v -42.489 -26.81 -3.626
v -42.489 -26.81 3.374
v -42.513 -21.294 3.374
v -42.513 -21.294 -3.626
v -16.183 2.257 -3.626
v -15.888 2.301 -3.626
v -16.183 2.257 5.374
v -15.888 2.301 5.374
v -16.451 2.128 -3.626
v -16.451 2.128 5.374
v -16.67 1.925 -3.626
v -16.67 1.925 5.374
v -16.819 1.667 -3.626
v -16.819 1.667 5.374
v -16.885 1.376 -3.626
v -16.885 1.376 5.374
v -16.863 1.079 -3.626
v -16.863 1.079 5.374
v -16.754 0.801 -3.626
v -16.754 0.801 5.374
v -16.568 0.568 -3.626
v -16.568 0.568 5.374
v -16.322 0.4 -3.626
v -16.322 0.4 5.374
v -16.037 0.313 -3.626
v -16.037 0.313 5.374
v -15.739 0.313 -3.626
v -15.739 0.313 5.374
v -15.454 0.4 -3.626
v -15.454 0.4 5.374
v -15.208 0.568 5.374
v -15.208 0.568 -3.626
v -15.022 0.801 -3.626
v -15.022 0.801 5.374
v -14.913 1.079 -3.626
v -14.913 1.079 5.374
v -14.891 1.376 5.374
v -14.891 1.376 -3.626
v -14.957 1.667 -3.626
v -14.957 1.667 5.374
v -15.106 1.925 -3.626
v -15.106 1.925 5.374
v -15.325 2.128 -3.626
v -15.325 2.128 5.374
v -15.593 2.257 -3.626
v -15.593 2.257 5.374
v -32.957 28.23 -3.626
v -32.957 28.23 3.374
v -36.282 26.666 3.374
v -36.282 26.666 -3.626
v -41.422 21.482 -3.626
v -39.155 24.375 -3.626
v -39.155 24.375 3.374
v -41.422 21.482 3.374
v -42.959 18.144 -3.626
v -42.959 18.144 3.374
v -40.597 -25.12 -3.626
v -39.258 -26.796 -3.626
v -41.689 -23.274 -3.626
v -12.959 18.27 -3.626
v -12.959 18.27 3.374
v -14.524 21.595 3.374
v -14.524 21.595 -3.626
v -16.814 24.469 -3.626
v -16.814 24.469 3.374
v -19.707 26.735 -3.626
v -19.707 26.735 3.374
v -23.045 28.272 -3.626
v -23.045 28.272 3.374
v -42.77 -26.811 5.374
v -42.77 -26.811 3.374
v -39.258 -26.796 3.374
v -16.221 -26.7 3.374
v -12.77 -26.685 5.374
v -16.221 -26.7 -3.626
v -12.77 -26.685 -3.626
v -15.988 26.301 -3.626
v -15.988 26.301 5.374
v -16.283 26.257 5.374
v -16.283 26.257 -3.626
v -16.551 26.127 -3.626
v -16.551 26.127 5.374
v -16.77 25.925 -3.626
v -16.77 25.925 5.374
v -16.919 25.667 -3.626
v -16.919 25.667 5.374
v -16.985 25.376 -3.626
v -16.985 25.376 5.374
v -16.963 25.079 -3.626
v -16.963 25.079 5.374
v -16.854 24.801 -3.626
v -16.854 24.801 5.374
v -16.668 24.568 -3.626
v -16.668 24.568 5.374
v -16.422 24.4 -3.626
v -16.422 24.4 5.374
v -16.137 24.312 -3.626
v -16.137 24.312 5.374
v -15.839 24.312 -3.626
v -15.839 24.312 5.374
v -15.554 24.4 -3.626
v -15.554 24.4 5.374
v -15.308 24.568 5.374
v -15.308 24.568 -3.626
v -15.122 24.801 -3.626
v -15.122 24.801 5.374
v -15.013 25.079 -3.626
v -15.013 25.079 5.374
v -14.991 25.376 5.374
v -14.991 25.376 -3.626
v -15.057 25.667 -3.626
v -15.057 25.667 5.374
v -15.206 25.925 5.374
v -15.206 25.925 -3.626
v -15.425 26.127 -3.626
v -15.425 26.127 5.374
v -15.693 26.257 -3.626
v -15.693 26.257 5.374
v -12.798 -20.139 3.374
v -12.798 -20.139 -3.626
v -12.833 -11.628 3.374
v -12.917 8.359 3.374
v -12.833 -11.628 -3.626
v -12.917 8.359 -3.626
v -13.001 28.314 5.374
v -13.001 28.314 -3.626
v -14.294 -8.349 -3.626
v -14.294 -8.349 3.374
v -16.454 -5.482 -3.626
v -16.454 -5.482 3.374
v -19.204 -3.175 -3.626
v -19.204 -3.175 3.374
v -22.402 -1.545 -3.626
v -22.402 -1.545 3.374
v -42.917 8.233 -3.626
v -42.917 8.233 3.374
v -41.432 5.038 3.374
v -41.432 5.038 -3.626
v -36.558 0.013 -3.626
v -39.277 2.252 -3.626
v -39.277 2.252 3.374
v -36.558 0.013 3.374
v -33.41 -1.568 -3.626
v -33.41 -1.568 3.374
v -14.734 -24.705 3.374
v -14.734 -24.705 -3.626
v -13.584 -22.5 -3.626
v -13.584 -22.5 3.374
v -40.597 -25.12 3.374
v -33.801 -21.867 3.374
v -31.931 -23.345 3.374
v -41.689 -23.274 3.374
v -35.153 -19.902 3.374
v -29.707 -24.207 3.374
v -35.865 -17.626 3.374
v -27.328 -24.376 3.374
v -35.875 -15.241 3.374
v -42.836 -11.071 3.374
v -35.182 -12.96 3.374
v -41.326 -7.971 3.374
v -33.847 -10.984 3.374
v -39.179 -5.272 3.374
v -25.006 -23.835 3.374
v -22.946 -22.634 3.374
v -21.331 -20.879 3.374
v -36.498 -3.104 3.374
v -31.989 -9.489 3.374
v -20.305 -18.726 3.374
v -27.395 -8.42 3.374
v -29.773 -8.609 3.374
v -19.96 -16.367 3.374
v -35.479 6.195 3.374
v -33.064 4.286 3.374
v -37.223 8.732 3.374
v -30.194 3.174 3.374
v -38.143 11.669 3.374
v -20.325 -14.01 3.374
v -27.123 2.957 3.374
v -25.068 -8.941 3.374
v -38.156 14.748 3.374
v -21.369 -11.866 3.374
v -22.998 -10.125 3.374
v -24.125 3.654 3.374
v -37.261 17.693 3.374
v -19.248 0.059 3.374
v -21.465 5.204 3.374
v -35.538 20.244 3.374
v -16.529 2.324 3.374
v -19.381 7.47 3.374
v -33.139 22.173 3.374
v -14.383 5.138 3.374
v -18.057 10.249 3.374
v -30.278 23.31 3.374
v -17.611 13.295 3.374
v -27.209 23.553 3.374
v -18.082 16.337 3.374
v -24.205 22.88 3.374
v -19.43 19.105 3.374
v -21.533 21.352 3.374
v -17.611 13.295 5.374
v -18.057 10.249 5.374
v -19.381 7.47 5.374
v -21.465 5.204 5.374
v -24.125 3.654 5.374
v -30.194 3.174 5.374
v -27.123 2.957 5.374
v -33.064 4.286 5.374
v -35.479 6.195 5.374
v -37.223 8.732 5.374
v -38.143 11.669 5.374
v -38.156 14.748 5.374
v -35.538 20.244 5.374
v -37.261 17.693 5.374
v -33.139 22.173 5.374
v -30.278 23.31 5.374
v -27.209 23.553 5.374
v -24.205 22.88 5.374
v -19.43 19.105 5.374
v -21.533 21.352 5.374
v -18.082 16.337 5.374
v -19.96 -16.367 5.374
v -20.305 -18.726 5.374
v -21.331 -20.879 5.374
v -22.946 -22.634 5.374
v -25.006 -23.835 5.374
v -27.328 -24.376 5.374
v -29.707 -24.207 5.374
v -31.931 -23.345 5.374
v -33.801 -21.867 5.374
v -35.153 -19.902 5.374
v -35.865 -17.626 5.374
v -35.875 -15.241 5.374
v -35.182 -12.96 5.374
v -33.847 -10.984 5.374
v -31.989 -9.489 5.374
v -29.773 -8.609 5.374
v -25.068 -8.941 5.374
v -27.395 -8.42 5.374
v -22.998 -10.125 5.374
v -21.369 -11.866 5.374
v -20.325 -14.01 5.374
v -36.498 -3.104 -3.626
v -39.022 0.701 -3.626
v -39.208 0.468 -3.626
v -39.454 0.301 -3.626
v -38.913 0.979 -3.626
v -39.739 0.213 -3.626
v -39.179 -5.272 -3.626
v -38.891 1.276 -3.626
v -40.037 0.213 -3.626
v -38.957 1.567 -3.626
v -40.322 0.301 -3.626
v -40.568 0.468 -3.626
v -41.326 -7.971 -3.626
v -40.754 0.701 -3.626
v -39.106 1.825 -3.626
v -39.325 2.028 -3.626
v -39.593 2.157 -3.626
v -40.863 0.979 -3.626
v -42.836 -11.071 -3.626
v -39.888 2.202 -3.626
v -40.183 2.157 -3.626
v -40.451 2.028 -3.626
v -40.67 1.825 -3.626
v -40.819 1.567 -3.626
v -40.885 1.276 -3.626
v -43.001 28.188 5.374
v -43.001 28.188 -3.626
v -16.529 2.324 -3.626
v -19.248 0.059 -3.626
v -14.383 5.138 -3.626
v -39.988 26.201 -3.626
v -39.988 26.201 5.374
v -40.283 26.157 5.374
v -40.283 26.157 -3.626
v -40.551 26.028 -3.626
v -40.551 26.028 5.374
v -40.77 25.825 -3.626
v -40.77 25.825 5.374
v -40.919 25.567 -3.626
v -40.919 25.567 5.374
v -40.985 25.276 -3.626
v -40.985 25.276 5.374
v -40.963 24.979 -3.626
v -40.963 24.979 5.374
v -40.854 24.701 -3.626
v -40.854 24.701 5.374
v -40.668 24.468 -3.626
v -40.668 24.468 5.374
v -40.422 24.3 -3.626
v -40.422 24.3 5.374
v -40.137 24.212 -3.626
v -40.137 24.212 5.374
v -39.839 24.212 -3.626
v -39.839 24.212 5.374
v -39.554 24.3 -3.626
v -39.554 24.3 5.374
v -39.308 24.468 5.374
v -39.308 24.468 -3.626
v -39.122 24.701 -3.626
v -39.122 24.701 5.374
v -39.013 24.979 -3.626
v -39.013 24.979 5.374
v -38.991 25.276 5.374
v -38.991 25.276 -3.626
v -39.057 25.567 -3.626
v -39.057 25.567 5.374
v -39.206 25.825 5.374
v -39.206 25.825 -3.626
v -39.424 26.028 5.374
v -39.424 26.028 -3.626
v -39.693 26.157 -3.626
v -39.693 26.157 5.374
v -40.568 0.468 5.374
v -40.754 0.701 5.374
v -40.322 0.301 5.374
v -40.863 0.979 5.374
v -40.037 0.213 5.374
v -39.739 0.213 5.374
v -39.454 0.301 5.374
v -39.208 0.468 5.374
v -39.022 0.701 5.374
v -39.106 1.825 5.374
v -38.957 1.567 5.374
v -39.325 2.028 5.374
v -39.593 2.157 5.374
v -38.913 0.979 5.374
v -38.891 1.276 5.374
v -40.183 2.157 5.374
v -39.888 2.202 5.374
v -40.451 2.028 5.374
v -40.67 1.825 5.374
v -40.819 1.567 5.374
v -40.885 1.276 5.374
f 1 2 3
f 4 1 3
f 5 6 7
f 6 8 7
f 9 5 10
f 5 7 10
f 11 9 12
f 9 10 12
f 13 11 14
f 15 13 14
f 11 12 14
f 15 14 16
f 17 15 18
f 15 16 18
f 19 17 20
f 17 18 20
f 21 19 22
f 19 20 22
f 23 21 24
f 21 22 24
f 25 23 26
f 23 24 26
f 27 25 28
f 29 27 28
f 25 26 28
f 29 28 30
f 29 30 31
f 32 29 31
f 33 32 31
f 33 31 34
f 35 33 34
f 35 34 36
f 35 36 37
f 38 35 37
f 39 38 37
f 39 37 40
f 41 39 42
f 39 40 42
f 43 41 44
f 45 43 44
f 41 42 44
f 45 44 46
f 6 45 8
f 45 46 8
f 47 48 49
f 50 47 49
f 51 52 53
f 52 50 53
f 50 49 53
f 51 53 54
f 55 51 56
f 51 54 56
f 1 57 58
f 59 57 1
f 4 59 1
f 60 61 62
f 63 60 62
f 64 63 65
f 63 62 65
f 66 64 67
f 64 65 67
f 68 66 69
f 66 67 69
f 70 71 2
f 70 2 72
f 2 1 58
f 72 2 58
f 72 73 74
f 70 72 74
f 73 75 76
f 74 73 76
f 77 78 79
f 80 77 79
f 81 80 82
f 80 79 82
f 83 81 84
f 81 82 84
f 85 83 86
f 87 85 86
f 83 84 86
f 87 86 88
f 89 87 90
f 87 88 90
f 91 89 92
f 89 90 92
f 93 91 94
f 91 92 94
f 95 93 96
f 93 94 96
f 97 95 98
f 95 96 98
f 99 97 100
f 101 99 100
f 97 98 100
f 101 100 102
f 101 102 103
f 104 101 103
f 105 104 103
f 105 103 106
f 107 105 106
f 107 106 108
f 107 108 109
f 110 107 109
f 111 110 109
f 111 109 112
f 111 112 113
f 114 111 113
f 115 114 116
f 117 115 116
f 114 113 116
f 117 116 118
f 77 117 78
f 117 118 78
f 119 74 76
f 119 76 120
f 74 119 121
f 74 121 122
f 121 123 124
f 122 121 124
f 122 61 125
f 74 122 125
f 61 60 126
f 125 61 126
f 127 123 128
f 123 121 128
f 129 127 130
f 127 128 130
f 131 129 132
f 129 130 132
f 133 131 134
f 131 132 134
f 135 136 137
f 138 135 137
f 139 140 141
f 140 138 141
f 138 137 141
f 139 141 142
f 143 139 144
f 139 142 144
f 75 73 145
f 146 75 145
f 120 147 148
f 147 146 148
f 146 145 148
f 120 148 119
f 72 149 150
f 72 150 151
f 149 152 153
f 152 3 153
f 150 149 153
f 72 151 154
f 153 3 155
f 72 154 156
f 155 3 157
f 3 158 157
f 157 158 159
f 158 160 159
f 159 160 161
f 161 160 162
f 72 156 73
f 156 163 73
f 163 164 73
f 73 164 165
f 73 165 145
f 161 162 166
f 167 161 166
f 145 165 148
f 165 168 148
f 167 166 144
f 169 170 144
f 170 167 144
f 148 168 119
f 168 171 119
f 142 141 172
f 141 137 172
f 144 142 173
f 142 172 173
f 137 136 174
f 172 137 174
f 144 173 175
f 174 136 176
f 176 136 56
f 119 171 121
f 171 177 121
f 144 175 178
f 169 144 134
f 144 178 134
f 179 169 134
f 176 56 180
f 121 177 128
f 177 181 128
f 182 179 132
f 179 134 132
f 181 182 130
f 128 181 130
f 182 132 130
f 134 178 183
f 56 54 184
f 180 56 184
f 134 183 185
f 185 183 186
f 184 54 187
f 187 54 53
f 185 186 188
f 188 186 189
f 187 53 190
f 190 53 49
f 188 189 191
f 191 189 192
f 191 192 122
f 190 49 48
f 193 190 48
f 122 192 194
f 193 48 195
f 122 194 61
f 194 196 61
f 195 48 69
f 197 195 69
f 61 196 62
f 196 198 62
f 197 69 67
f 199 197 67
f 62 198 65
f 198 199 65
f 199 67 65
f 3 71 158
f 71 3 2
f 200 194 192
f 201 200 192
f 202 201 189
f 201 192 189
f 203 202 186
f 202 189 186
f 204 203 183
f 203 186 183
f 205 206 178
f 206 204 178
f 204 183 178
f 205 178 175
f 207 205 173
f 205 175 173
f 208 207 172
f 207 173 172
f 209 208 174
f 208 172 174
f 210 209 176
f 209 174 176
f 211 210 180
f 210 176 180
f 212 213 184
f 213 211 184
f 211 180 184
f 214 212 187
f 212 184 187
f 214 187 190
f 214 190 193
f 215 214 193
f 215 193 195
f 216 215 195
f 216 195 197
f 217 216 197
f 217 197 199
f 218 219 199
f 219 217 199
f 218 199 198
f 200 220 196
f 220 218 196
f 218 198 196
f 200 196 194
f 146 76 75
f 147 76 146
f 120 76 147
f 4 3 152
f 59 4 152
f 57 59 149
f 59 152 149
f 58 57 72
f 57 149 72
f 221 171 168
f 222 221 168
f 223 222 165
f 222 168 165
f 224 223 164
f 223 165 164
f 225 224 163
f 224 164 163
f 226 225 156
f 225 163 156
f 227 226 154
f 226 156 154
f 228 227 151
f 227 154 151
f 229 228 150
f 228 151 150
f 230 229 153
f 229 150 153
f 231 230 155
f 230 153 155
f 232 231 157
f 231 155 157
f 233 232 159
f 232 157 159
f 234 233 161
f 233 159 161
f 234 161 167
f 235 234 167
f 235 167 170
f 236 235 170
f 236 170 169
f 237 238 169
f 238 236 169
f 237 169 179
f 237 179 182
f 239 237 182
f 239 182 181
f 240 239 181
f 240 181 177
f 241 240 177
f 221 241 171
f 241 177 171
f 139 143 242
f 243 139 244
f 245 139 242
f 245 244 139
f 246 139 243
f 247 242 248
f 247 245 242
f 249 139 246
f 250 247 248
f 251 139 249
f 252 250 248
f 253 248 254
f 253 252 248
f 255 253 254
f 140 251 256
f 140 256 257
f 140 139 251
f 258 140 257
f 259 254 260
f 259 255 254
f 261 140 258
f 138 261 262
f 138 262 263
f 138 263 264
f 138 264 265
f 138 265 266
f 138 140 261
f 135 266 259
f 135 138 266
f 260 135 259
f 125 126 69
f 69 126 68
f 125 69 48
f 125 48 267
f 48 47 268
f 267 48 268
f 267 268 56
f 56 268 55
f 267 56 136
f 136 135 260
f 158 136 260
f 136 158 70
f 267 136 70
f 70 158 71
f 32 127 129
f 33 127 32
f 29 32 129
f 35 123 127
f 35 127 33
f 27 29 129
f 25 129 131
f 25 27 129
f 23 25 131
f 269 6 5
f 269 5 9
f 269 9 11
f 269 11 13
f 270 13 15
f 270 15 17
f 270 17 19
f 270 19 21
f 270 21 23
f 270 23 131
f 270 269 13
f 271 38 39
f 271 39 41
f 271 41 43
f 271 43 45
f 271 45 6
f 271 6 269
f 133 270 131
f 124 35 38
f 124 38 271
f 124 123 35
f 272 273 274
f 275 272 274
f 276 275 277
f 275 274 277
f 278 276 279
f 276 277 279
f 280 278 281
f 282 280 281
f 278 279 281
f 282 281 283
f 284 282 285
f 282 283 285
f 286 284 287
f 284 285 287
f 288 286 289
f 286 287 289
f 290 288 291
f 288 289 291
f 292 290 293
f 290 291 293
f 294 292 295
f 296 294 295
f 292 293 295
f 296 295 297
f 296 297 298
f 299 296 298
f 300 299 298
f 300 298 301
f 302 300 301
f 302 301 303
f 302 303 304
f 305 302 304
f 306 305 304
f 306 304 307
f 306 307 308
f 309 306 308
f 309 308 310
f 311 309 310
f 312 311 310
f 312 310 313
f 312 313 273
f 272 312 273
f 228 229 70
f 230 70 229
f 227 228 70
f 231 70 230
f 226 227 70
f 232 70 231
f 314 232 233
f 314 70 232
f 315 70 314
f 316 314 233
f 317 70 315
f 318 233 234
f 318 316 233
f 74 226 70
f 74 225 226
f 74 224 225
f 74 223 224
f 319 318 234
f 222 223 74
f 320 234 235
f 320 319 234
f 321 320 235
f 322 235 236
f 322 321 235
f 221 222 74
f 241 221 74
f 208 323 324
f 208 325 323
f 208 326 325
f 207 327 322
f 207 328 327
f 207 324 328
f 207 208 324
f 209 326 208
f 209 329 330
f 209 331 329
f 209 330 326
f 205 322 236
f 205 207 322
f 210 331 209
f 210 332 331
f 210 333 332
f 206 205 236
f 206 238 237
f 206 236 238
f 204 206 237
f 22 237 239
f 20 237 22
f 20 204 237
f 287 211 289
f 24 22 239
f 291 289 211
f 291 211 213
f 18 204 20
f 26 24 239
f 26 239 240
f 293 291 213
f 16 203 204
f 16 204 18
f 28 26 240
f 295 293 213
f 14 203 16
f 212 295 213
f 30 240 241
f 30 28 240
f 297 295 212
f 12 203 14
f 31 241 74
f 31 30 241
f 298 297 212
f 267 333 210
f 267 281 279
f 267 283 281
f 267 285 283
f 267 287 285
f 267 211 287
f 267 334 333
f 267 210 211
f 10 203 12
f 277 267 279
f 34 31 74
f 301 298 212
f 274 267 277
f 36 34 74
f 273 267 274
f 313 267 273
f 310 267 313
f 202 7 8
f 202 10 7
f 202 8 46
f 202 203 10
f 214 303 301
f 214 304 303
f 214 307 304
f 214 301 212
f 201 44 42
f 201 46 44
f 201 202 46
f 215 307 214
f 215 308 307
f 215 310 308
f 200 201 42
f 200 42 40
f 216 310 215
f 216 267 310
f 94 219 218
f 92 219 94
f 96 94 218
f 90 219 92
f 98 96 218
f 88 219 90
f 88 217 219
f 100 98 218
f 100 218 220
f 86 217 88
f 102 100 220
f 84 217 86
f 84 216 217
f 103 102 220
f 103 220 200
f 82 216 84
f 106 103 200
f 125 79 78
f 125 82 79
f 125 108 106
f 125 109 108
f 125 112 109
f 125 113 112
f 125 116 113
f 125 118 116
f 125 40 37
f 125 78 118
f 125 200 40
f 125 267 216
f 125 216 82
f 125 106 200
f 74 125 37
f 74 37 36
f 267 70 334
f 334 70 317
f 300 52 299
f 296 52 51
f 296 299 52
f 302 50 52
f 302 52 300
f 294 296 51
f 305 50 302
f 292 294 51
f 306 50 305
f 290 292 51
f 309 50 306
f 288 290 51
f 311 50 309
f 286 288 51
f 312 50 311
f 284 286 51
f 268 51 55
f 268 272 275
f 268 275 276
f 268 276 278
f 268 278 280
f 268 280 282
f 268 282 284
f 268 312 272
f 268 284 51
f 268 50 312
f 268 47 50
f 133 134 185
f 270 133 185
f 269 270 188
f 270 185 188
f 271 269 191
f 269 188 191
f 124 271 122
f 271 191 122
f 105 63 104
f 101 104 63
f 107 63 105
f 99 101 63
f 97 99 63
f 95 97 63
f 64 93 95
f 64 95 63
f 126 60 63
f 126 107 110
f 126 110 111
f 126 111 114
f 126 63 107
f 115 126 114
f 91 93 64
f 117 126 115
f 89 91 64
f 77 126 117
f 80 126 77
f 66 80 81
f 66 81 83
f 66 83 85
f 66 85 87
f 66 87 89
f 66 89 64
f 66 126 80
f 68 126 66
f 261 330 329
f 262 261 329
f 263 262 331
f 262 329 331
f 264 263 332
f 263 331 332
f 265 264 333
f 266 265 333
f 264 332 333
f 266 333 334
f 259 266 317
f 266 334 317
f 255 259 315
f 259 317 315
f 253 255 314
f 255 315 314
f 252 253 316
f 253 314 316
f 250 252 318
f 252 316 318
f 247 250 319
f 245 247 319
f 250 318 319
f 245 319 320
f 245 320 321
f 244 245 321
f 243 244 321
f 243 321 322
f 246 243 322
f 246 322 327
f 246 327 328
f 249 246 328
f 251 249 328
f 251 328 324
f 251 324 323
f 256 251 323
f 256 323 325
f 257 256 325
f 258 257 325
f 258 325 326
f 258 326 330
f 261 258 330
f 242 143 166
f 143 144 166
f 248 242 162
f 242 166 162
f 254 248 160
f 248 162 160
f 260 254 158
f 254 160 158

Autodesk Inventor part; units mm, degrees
ref_plane "YZ Plane" through (0, 0, 0) normal (1, 0, 0) x (0, 1, 0)
ref_plane "XZ Plane" through (0, 0, 0) normal (0, 1, 0) x (-1, 0, 0)
ref_plane "XY Plane" through (0, 0, 0) normal (0, 0, 1) x (1, 0, 0)
ref_plane "Work Plane1" through (0, 0, 0) normal (0, 0, 1) x (1, 0, 0)
ref_plane "Work Plane2" through (-27.9392, 13.2515, 3.3744) normal (0, 0, 1) x (1, 0.0042, 0)
sketch "Sketch4" plane through (-27.9392, 13.2515, 3.3744) normal (0, 0, 1) x (1, 0.0042, 0)
  circle A0 centre (0.0013, -0.0001) radius 12.5 construction
  line L0 (15.0013, 14.9999) -> (-14.9987, 14.9999) construction
  line L1 (-14.9987, 14.9999) -> (-14.9987, -40.0001) construction
  line L2 (-14.9987, -40.0001) -> (15.0013, -40.0001) construction
  line L3 (15.0013, -40.0001) -> (15.0013, 14.9999) construction
  line L4 (15.0013, 14.9999) -> (-14.9987, 14.9999)
  line L5 (-14.9987, 14.9999) -> (-14.9987, -40.0001)
  line L6 (-14.9987, -40.0001) -> (15.0013, -40.0001)
  line L7 (15.0013, -40.0001) -> (15.0013, 14.9999)
  circle A1 centre (0.0013, -0.0001) radius 10.3271
  circle A2 centre (-0.1451, -29.1987) radius 12.8 construction
  circle A3 centre (-0.1451, -29.6517) radius 8.1726 construction
  circle A4 centre (-0.1451, -29.6517) radius 8
  point P0 (27.8838, -13.3677)
  dimension "d13" = 15
  dimension "d14" = 15
  dimension "d15" = 15
  dimension "d16" = 40
  dimension "d17" = 16
  dimension "d34" = 29.652
extrude "Extrusion4" add sketch "Sketch4" along normal blind 2
sketch "Sketch5" plane through (-27.9392, 13.2515, 3.3744) normal (0, 0, -1) x (-1, -0.0042, 0)
  line L0 (15.2891, -0.4637) -> (15.1772, -1.9039) construction
  circle A0 centre (-0.0013, -0.0001) radius 12.5 construction
  line L1 (15.4424, -29.5809) -> (15.3809, -31.0242) construction
  circle A1 centre (-0.0013, -0.0001) radius 10.3271 construction
  circle A2 centre (0.1451, -29.6517) radius 8 construction
  line L2 (-15.0013, 14.9999) -> (14.9987, 14.9999) construction
  line L3 (-15.0013, -40.0001) -> (-15.0013, 14.9999) construction
  line L4 (14.9987, -40.0001) -> (-15.0013, -40.0001) construction
  line L5 (14.9987, 14.9999) -> (14.9987, -40.0001) construction
  line L6 (-15.0013, -40.0001) -> (14.7184, -40.0001)
  circle A3 centre (-0.0013, -0.0001) radius 15.2975 construction
  line L7 (14.9987, -40.0001) -> (-15.0013, -40.0001) projected
  line L8 (14.9987, 14.9999) -> (14.9987, -40.0001) projected
  line L9 (-15.0013, -40.0001) -> (-15.0013, 14.9999) projected
  line L10 (14.9987, 4.9557) -> (14.9987, 14.9999)
  arc A4 (5.5328, -14.7966) -> (14.9987, -4.956) centre (-0.0013, -0.0001) ccw
  line L11 (14.7184, -40.0001) -> (14.7184, -34.4839)
  line L12 (14.9987, -24.2596) -> (14.9987, -4.956)
  arc A5 (14.9987, -24.2596) -> (5.5328, -14.7966) centre (0.1451, -29.6517) ccw
  arc A6 (11.4871, -40.0001) -> (14.7184, -34.4839) centre (0.1451, -29.6517) ccw
  line L13 (-15.0013, 4.9557) -> (-15.0013, -4.956)
  line L14 (-15.0013, -33.4542) -> (-15.0013, -40.0001)
  arc A7 (-4.7152, -14.5532) -> (-15.0013, -24.943) centre (0.1451, -29.6517) ccw
  arc A8 (-15.0013, -33.4542) -> (-11.5503, -40.0001) centre (0.1451, -29.6517) ccw
  arc A9 (-15.0013, -4.956) -> (-5.4746, -14.8192) centre (-0.0013, -0.0001) ccw
  arc A10 (14.9987, 4.9557) -> (4.9545, 14.9999) centre (-0.0013, -0.0001) ccw
  arc A11 (-4.9572, 14.9999) -> (-15.0013, 4.9557) centre (-0.0013, -0.0001) ccw
  line L15 (14.9987, 14.9999) -> (3.0009, 14.9999)
  line L16 (-3.0035, 14.9999) -> (-15.0013, 14.9999)
  line L17 (-15.0013, -4.956) -> (-15.0013, -24.943)
  line L18 (14.9987, -4.956) -> (14.9987, -24.2596)
  point P0 (-27.8838, -13.3677)
  point P1 (10.9564, -8.3909)
extrude "Extrusion5" add sketch "Sketch5" along normal blind 7
sketch "Sketch6" plane through (-27.9392, 13.2515, -3.6256) normal (0, 0, -1) x (-1, -0.0042, 0)
  line L0 (-15.0013, -40.0001) -> (-11.5503, -40.0001) projected
  arc A0 (-5.4746, -14.8192) -> (-15.0013, -24.943) centre (0.1451, -29.6517) ccw projected
  line L1 (-15.0013, -33.4542) -> (-15.0013, -40.0001) projected
  line L2 (-15.0013, -4.956) -> (-15.0013, -24.943) projected
  line L3 (14.7184, -40.0001) -> (14.7184, -34.4839) projected
  line L4 (11.4871, -40.0001) -> (14.7184, -40.0001) projected
  arc A1 (-15.0013, -33.4542) -> (-11.5503, -40.0001) centre (0.1451, -29.6517) ccw projected
  arc A2 (-4.9572, 14.9999) -> (-15.0013, 4.9557) centre (-0.0013, -0.0001) ccw projected
  line L5 (-4.9572, 14.9999) -> (-15.0013, 14.9999) projected
  line L6 (-15.0013, 14.9999) -> (-15.0013, 4.9557) projected
  arc A3 (11.4871, -40.0001) -> (14.7184, -34.4839) centre (0.1451, -29.6517) ccw projected
  arc A4 (-15.0013, -4.956) -> (-5.4746, -14.8192) centre (-0.0013, -0.0001) ccw projected
  line L7 (-12.0013, 11.9999) -> (11.9987, 11.9999) construction
  line L8 (11.9987, 11.9999) -> (11.9987, -12.0001) construction
  line L9 (11.9987, -12.0001) -> (-12.0013, -12.0001) construction
  line L10 (-12.0013, -12.0001) -> (-12.0013, 11.9999) construction
  line L11 (-12.0013, 11.9999) -> (11.9987, -12.0001) construction
  line L12 (11.9987, 11.9999) -> (-12.0013, -12.0001) construction
  dimension "d32" = 24
  dimension "d33" = 24
hole "Hole1" at (-39.9878, 25.2013, -3.6256) at (-39.8879, 1.2015, -3.6256) at (-15.8881, 1.3014, -3.6256) at (-15.988, 25.3012, -3.6256) direction (0, 0, 1) diameter 2 depth 24 tip angle 118
sketch "Sketch7" plane through (-27.9392, 13.2515, -3.6256) normal (0, 0, -1) x (-1, -0.0042, 0)
  circle A0 centre (-0.0013, -0.0001) radius 10.3271 projected
  line L0 (-12.0013, 11.9999) -> (11.9987, 11.9999) construction
  line L1 (11.9987, 11.9999) -> (11.9987, -12.0001) construction
  line L2 (11.9987, -12.0001) -> (-12.0013, -12.0001) construction
  line L3 (-12.0013, -12.0001) -> (-12.0013, 11.9999) construction
  line L4 (-12.0013, 11.9999) -> (11.9987, -12.0001) construction
  line L5 (11.9987, 11.9999) -> (-12.0013, -12.0001) construction
  point P0 (-27.8838, -13.3677)
  dimension "d30" = 24
  dimension "d31" = 24
properties part number "200_Gearbox_conterplate"
